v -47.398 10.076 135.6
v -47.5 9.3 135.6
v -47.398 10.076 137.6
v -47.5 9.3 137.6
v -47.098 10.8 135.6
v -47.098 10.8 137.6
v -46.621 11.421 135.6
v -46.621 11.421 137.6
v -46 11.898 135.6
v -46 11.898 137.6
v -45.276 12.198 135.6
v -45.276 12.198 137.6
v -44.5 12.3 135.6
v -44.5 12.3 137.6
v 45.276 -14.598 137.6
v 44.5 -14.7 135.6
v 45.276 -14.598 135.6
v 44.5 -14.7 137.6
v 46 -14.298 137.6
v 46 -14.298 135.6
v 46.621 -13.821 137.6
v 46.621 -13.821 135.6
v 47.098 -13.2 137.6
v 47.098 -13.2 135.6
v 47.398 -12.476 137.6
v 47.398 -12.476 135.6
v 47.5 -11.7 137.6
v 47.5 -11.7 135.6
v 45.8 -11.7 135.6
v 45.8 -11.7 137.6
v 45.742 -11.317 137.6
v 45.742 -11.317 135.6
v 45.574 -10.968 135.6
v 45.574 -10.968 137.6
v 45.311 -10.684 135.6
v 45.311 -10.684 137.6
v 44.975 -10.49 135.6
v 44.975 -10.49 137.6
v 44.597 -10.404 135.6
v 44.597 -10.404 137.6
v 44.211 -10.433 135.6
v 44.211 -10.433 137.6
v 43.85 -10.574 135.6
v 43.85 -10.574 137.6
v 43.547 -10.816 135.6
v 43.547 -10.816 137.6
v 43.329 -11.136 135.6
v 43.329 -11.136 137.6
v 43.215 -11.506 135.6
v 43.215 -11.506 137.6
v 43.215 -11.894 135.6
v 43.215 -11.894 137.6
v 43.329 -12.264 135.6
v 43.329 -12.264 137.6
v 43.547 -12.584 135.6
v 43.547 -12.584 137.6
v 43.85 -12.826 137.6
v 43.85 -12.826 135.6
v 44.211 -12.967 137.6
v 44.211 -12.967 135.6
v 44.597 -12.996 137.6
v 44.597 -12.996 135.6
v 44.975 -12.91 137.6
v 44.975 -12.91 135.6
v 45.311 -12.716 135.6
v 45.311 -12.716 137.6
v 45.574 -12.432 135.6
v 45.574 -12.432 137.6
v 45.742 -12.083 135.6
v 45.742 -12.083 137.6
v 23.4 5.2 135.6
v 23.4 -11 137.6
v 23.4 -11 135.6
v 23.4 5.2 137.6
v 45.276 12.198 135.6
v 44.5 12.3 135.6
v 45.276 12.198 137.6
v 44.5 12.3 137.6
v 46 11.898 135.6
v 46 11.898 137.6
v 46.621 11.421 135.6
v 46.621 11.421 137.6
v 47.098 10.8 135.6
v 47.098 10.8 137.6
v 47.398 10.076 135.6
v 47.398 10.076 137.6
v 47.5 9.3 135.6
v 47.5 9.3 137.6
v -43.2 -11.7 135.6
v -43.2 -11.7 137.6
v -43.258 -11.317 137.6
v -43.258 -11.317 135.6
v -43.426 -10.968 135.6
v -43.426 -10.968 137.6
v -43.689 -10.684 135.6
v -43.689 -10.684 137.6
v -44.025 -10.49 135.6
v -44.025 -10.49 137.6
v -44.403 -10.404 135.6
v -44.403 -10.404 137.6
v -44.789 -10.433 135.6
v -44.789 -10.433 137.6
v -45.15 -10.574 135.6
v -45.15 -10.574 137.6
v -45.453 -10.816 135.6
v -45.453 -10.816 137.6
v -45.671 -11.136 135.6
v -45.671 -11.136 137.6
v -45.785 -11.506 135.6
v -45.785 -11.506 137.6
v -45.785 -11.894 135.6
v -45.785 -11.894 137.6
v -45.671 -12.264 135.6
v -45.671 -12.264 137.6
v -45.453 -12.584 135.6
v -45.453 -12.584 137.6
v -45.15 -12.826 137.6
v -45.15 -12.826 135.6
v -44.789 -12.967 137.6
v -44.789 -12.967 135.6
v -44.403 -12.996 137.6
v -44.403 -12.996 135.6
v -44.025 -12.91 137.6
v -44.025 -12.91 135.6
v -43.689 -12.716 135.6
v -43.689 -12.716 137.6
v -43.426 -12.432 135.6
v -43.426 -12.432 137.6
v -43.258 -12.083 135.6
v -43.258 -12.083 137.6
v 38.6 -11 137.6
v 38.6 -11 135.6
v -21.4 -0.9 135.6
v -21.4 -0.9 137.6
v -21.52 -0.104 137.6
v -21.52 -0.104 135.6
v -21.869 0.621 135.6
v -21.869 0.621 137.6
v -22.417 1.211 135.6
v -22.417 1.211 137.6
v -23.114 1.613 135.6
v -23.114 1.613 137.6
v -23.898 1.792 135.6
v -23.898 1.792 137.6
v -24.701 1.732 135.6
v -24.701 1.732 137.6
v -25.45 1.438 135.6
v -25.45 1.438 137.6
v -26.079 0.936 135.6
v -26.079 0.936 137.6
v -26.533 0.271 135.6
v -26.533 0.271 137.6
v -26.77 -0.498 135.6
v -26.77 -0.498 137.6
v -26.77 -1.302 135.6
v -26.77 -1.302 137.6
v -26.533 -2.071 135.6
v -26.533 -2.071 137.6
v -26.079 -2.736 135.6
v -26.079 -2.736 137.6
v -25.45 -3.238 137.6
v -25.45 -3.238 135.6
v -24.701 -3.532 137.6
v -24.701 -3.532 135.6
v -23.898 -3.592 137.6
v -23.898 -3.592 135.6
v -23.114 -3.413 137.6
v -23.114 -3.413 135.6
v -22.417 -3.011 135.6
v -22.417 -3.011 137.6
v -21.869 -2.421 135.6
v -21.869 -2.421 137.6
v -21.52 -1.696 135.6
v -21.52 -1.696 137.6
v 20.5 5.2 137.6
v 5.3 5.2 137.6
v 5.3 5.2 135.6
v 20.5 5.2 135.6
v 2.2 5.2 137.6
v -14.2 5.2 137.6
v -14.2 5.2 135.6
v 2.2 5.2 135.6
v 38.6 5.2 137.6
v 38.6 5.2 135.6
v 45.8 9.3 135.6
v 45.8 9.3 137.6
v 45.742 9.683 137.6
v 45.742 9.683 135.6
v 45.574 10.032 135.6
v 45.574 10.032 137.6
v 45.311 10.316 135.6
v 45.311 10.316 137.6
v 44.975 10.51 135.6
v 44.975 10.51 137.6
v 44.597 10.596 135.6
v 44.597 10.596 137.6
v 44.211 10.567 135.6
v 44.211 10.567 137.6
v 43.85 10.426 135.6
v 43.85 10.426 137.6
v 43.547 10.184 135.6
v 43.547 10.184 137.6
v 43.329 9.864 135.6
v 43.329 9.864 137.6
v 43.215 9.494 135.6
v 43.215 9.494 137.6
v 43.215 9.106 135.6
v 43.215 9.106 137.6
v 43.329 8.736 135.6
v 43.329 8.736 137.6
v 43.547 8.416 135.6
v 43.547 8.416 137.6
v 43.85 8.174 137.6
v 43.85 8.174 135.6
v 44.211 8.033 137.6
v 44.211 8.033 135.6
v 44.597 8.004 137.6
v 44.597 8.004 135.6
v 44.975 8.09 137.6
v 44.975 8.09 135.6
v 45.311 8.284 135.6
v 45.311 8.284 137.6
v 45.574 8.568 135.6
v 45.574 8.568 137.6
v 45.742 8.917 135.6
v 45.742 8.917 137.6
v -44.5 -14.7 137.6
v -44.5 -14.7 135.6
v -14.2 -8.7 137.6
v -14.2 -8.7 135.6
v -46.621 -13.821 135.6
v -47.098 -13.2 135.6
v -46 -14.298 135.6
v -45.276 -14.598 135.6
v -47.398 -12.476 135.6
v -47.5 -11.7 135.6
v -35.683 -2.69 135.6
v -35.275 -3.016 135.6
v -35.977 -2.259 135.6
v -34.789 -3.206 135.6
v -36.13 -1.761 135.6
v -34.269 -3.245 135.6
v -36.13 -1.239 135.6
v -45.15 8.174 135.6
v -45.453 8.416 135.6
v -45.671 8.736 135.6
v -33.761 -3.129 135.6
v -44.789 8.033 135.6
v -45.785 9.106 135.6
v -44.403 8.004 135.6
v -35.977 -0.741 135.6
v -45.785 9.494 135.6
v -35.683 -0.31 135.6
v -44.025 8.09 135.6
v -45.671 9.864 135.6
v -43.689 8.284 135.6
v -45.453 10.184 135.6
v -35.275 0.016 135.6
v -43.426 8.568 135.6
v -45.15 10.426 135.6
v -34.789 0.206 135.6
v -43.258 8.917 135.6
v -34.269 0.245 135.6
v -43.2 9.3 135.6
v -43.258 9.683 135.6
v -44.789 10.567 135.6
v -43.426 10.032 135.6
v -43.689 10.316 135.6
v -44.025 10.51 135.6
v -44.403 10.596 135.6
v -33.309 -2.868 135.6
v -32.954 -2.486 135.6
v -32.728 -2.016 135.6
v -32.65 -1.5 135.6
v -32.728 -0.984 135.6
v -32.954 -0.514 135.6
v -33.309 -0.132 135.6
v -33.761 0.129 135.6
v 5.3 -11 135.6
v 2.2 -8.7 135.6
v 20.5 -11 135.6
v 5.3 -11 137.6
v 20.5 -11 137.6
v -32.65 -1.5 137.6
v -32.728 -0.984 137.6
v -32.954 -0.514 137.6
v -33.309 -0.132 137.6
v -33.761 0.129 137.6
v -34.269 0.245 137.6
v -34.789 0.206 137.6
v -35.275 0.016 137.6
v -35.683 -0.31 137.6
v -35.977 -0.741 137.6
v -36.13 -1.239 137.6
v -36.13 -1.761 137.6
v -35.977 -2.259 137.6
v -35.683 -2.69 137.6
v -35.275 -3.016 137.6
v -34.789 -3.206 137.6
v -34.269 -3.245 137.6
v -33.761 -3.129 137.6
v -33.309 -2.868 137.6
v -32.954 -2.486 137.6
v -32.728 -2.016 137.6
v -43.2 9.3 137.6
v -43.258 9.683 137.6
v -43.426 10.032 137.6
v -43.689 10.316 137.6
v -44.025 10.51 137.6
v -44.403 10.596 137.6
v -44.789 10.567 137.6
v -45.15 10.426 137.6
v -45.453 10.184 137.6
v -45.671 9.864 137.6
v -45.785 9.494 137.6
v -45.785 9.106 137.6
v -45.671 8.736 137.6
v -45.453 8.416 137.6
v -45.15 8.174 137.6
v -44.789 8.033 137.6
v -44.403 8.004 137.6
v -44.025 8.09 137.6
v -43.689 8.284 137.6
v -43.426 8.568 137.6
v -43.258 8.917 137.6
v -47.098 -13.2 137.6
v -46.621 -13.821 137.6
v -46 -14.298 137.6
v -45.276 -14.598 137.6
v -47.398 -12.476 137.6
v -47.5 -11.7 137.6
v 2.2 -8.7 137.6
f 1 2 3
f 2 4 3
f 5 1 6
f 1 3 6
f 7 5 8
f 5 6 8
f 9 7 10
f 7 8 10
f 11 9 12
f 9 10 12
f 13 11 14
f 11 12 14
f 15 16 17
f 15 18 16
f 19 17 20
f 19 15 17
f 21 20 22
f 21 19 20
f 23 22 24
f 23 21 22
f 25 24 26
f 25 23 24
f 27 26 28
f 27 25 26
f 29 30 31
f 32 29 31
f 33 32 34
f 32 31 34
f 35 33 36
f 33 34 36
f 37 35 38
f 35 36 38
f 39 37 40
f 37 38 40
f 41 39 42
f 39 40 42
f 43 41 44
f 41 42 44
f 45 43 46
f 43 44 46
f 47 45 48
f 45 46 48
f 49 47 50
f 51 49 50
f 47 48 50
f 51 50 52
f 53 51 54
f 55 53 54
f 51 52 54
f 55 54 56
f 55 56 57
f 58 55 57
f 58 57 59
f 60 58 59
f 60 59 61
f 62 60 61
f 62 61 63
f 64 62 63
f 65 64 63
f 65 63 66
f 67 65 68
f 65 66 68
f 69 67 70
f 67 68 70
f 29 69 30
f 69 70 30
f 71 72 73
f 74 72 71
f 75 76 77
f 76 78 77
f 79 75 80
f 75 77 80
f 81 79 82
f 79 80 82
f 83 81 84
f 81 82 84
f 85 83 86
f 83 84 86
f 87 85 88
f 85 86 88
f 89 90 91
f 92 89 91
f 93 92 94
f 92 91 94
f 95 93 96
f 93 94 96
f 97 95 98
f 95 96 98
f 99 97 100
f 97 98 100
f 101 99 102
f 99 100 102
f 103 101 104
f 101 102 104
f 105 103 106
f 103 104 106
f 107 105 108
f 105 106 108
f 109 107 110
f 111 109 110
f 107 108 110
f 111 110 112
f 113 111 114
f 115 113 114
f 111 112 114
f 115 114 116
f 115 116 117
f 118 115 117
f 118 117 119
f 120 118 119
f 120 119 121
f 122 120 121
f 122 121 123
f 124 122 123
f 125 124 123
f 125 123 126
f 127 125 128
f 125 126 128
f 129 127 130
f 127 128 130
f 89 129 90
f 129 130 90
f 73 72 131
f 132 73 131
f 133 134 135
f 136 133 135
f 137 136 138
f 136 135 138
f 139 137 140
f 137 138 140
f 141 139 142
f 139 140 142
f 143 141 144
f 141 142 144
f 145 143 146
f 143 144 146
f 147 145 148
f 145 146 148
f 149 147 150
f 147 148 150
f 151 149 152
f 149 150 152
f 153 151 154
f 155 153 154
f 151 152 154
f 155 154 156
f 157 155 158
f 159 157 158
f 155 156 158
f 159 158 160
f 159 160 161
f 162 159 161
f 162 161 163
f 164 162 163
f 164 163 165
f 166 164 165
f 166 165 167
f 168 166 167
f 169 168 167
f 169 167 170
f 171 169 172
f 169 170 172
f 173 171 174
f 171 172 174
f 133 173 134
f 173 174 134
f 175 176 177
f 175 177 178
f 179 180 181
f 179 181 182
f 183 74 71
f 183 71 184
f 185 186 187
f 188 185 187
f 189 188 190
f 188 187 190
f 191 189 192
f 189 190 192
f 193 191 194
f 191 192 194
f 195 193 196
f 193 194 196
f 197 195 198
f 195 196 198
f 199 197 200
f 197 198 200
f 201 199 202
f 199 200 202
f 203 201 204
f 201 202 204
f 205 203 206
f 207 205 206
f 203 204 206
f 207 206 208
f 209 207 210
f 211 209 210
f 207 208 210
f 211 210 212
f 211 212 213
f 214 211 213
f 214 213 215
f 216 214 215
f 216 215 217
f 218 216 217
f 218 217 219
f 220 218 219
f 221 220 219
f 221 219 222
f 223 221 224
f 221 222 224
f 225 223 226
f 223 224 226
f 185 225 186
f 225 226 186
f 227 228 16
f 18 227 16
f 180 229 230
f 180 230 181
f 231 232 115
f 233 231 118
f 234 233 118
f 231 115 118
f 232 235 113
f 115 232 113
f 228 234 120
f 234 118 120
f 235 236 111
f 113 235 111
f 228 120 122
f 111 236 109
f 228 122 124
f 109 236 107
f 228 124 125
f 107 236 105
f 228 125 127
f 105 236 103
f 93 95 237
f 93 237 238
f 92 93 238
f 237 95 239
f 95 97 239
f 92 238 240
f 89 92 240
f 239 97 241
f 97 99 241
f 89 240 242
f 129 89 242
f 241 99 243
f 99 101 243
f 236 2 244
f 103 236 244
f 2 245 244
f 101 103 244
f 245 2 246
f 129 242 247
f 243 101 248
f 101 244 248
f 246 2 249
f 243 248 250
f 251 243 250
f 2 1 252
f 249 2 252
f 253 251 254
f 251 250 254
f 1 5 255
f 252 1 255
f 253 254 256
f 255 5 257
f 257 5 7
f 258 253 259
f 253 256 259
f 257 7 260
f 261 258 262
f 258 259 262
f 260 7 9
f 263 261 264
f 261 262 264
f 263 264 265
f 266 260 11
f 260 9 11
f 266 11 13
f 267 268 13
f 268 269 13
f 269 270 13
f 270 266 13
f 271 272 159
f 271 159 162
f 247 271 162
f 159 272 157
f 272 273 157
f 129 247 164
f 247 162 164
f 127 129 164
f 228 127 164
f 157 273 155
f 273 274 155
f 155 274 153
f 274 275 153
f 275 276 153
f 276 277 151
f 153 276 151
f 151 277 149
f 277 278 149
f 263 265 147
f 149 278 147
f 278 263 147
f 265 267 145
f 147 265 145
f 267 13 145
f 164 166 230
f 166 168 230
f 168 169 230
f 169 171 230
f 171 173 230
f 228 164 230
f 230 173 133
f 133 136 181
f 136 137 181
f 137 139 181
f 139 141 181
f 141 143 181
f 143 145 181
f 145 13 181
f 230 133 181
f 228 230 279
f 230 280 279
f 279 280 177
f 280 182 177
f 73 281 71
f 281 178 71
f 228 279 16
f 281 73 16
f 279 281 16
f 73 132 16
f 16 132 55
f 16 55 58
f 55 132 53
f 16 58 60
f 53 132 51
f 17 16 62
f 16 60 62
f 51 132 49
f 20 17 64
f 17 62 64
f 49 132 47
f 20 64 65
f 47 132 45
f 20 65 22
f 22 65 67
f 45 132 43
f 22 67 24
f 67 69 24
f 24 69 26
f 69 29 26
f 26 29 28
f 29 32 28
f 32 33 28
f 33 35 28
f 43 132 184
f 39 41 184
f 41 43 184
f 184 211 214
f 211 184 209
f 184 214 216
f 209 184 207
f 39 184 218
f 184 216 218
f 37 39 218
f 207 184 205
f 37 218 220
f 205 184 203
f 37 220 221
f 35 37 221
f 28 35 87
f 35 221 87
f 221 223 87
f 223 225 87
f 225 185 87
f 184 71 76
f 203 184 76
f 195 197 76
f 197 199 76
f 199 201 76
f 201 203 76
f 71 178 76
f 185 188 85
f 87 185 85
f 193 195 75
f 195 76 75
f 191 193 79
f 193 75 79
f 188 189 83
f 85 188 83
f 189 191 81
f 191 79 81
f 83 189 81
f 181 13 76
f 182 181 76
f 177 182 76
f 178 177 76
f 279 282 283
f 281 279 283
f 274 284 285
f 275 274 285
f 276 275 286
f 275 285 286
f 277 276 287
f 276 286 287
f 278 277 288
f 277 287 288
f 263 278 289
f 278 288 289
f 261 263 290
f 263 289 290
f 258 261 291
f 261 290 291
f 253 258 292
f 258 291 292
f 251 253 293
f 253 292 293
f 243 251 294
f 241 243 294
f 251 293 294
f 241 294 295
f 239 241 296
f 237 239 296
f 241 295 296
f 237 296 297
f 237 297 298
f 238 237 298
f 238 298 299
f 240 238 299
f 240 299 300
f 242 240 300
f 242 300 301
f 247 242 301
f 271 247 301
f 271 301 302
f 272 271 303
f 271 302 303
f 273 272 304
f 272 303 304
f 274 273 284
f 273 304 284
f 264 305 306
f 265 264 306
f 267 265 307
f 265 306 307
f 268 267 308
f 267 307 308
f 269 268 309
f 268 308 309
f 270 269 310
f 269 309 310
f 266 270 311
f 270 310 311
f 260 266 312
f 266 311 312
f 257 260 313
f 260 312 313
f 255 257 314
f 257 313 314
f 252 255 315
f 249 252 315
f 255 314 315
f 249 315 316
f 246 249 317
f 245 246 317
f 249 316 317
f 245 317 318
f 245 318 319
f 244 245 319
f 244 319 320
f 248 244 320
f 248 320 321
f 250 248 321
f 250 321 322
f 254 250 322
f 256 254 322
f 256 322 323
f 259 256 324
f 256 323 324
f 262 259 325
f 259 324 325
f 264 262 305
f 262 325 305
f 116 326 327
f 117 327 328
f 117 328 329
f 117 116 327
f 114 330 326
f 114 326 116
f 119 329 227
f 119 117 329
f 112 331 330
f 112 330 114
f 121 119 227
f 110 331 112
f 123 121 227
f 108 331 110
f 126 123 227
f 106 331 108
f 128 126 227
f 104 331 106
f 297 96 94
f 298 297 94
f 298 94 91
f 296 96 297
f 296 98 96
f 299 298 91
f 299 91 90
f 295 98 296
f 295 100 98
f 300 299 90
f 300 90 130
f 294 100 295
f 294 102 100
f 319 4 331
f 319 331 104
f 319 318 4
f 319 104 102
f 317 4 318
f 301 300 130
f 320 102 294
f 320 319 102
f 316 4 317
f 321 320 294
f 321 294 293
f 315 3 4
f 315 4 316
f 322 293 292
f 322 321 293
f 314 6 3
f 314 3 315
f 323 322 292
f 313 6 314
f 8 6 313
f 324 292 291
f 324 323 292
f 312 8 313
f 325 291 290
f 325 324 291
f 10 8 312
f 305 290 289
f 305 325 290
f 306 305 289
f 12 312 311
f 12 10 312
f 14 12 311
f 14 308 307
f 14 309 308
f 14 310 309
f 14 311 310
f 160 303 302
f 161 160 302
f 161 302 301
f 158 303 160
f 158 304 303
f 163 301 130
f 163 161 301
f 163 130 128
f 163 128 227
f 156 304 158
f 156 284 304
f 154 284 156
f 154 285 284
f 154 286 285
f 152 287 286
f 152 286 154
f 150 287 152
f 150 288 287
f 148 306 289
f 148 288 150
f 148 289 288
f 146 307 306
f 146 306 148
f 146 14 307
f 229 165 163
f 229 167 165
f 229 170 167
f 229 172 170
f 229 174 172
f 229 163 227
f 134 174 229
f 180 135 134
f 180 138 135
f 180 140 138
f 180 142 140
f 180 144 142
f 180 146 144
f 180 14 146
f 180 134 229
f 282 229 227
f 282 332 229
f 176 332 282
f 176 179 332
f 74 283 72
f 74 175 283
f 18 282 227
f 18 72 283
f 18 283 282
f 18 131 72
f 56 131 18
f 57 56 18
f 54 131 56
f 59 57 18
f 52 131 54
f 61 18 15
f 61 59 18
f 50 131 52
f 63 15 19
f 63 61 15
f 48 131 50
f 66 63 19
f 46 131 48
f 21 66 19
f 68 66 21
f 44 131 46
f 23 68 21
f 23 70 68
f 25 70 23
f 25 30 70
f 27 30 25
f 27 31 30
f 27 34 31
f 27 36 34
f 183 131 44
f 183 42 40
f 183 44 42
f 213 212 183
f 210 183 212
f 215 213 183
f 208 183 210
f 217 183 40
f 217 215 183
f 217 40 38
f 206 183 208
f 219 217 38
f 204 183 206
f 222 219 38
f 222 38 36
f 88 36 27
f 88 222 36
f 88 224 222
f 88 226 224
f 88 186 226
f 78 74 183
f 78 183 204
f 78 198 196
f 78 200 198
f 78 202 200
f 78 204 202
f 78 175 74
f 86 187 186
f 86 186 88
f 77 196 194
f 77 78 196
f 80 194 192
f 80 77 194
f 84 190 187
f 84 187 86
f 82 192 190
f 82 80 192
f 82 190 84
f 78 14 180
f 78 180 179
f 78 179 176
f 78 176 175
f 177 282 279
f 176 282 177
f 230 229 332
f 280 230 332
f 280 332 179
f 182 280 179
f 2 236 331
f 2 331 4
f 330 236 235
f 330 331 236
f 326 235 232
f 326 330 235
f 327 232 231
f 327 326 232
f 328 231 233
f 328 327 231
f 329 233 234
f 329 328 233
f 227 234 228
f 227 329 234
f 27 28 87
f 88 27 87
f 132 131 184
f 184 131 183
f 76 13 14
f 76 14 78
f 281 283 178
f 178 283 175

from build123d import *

# Parameters (mm, degrees)
SKETCH010_W     = 95
SKETCH010_H     = 27
PAD004_DEPTH    = 2
SKETCH011_R     = 1.3
POCKET006_DEPTH = 2
FILLET004_R     = 3
SKETCH012_R     = 1.75
SKETCH012_R_2   = 2.7
POCKET007_DEPTH = 2
SKETCH013_W     = 15.2
SKETCH013_H     = 16.2
SKETCH013_W_2   = 16.4
SKETCH013_H_2   = 13.9
POCKET008_DEPTH = 2


with BuildPart() as part:
    # Sketch010 → Pad004 (new body)
    with BuildSketch(Plane.XY):
        Rectangle(SKETCH010_W, SKETCH010_H)
    extrude(amount=PAD004_DEPTH)

    # Sketch011 (on Face6 of Pad004) → Pocket006 (cut)
    with BuildSketch(Plane.XY.offset(2)):
        with Locations((-44.5, 10.5)):
            Circle(SKETCH011_R)
        with Locations((44.5, 10.5)):
            Circle(SKETCH011_R)
        with Locations((44.5, -10.5)):
            Circle(SKETCH011_R)
        with Locations((-44.5, -10.5)):
            Circle(SKETCH011_R)
    extrude(amount=-POCKET006_DEPTH, mode=Mode.SUBTRACT)

    # Fillet004
    fillet004_edges = [part.edges().sort_by_distance(p)[0] for p in [
        (-47.5, -13.5, 1),
        (47.5, -13.5, 1),
        (47.5, 13.5, 1),
        (-47.5, 13.5, 1),
    ]]
    fillet(fillet004_edges, radius=FILLET004_R)

    # Sketch012 (on Face5 of Fillet004) → Pocket007 (cut)
    with BuildSketch(Plane.XY.offset(2)):
        with Locations((-34.4, -0.3)):
            Circle(SKETCH012_R)
        with Locations((-24.1, 0.3)):
            Circle(SKETCH012_R_2)
    extrude(amount=-POCKET007_DEPTH, mode=Mode.SUBTRACT)

    # Sketch013 (on Face5 of Pocket007) → Pocket008 (cut)
    with BuildSketch(Plane.XY.offset(2)):
        with Locations((12.9, -1.7)):
            Rectangle(SKETCH013_W, SKETCH013_H)
        with Locations((31, -1.7)):
            Rectangle(SKETCH013_W, SKETCH013_H)
        with Locations((-6, -0.55)):
            Rectangle(SKETCH013_W_2, SKETCH013_H_2)
    extrude(amount=-POCKET008_DEPTH, mode=Mode.SUBTRACT)


with BuildPart() as part_1:
    # Body003 placement: moved
    add(part.part.moved(Location((0, -1.2, 135.6))))


solid = part_1.part
